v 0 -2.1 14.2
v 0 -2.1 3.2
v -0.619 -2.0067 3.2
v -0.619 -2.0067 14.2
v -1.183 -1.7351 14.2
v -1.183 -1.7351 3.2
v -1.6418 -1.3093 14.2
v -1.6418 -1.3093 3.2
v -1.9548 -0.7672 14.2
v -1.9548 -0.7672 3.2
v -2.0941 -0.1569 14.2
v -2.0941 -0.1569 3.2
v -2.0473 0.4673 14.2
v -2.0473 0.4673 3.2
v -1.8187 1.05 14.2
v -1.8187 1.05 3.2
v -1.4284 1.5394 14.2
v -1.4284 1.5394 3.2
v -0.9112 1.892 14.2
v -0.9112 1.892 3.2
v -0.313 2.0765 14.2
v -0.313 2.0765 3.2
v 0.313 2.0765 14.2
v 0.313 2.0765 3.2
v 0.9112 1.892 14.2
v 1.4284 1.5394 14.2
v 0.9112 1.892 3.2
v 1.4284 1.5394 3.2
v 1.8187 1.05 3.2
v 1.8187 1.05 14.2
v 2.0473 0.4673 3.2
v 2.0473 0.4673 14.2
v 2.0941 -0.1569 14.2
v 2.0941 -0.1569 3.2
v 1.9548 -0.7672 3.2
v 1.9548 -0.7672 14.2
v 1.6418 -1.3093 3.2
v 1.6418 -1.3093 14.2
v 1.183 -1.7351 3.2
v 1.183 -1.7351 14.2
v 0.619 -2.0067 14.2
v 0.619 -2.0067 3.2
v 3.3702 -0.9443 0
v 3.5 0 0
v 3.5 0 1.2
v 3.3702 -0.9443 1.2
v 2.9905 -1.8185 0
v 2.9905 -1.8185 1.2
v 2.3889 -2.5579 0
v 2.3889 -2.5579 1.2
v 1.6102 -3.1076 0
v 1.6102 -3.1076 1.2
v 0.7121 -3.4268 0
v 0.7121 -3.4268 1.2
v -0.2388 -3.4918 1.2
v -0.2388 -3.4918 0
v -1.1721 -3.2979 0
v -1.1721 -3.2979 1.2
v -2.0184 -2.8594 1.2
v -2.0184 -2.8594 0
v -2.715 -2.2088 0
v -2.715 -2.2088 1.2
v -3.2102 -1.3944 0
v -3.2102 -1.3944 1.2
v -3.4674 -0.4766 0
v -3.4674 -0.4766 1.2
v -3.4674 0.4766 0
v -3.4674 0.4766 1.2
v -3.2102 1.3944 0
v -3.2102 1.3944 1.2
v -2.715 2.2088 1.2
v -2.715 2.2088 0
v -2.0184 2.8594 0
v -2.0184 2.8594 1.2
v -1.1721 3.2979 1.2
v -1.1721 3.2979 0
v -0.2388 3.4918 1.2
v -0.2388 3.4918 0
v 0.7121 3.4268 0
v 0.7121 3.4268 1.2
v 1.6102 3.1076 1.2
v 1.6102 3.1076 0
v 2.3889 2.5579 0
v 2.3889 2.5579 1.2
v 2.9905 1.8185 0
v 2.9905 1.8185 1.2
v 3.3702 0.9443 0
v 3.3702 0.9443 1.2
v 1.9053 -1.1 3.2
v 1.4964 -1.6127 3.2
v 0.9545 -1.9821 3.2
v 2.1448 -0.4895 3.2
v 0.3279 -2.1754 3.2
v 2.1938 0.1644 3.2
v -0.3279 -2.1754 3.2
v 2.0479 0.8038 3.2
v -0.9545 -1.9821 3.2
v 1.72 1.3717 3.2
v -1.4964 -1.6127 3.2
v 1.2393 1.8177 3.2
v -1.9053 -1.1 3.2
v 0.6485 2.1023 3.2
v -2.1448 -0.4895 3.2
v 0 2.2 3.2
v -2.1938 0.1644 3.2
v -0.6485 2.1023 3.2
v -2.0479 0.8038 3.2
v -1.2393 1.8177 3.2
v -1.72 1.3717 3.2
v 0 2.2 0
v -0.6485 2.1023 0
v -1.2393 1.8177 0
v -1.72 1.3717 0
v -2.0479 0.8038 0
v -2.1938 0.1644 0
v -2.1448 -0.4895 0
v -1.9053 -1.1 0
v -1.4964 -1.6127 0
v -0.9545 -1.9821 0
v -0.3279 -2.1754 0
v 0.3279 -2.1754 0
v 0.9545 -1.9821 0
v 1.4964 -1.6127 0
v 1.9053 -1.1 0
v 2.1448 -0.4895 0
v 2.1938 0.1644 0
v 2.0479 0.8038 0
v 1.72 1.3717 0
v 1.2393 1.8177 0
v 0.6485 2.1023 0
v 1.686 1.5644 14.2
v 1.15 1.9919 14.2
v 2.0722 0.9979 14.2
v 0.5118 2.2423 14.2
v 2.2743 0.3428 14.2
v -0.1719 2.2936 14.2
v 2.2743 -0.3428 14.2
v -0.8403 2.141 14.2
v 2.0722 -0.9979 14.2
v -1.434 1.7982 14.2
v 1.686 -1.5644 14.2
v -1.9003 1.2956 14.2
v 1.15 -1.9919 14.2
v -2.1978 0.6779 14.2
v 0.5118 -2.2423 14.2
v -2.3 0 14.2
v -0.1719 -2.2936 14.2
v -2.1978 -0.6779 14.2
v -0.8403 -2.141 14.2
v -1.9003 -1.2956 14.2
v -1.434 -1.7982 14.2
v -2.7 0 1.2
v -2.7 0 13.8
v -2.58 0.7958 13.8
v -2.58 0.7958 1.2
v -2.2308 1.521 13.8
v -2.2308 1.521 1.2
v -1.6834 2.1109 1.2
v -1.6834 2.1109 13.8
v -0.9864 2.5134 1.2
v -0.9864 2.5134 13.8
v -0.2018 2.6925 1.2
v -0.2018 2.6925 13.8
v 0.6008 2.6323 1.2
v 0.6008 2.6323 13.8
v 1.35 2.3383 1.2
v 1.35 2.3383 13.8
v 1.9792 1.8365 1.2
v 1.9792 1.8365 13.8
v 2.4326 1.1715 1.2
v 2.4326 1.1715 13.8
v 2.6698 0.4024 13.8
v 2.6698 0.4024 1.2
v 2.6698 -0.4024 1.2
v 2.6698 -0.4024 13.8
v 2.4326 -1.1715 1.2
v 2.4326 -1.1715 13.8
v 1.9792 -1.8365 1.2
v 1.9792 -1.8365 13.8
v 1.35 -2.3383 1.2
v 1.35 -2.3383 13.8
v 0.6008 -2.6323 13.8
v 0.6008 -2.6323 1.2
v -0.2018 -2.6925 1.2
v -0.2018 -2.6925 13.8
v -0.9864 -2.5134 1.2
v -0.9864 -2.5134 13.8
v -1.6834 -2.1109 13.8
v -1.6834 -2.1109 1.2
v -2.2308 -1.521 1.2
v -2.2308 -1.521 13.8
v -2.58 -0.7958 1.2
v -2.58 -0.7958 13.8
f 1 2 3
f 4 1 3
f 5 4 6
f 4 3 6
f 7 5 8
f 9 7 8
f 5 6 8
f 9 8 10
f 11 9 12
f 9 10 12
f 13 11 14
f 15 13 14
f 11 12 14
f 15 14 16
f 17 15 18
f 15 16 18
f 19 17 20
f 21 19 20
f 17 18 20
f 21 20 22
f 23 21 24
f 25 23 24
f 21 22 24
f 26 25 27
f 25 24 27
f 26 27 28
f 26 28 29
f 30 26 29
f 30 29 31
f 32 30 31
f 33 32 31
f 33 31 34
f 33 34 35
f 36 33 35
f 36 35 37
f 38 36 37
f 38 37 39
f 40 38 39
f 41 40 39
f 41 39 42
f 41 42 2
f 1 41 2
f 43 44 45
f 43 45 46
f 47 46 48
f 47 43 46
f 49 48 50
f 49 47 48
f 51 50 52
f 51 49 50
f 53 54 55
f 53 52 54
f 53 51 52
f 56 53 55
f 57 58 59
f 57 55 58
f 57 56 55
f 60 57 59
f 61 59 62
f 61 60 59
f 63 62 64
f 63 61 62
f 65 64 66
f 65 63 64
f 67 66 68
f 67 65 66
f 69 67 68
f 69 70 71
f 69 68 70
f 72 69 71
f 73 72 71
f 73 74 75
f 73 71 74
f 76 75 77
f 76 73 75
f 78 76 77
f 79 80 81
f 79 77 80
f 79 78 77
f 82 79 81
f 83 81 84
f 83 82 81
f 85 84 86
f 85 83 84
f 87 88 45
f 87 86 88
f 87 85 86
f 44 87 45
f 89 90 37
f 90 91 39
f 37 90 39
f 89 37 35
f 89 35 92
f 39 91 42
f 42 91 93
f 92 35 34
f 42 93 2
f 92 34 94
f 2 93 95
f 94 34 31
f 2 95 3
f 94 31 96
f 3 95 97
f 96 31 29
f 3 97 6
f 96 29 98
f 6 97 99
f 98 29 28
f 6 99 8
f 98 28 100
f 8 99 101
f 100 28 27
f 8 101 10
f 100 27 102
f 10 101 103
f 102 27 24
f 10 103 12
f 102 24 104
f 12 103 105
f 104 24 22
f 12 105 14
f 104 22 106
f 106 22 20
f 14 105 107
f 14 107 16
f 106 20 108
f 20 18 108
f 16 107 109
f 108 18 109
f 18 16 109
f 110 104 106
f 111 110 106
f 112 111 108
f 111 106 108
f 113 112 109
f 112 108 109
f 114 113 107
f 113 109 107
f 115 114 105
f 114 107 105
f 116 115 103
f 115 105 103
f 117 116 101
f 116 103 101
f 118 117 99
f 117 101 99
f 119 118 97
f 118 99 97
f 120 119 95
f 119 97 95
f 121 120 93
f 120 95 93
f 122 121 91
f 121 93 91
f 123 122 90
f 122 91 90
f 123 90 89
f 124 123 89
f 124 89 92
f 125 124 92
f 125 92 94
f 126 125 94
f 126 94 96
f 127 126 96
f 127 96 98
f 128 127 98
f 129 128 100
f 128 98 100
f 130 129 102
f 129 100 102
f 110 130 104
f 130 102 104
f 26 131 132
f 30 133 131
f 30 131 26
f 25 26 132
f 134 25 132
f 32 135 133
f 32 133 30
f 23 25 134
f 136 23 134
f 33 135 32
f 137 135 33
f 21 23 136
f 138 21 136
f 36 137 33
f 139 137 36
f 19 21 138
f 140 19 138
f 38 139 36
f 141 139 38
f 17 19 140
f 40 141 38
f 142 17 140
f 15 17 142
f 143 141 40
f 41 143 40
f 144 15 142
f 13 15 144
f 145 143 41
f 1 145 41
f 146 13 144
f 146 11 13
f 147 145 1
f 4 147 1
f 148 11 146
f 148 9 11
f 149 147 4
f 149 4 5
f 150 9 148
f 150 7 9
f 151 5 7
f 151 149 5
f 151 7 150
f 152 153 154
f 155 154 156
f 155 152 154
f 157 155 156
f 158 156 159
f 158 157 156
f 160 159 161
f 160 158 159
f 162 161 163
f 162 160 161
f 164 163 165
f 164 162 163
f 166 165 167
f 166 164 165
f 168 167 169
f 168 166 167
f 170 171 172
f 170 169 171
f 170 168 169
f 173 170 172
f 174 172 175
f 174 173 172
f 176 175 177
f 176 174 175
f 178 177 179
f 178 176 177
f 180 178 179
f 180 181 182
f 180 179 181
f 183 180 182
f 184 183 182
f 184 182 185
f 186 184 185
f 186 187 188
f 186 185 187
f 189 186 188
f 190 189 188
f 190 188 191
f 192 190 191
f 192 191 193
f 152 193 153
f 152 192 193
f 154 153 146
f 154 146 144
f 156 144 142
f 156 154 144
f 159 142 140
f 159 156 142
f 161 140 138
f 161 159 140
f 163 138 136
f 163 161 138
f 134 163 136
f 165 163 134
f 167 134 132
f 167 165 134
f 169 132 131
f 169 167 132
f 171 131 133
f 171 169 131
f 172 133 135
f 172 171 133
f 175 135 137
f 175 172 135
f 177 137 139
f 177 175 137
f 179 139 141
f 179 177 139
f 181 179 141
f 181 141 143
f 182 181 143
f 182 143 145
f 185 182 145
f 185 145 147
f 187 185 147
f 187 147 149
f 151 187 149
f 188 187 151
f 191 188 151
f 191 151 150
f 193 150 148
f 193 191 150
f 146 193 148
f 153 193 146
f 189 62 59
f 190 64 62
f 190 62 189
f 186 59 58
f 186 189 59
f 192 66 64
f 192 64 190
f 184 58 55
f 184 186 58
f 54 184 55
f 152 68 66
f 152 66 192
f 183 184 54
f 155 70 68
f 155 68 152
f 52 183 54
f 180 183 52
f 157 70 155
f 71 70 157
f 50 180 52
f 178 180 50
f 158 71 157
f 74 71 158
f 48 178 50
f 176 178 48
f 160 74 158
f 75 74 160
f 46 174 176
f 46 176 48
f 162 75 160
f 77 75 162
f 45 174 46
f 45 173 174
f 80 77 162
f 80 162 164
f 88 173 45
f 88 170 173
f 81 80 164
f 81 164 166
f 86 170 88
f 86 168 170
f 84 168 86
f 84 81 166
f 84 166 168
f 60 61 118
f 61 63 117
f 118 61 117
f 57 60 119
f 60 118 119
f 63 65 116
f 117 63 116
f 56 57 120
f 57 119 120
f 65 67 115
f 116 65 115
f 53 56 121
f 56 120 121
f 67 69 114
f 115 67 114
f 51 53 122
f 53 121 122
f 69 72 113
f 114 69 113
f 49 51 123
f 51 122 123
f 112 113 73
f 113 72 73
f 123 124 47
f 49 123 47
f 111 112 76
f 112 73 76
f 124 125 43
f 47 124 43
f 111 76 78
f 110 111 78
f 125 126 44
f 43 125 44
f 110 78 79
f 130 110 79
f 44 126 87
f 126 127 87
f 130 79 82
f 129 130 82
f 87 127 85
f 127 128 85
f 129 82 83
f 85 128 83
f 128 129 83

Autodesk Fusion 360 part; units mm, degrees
sketch "Sketch1" plane through (0, 0, 0) normal (0, 0, 1) x (1, 0, 0)
  circle A0 centre (0, 0) radius 3.5
  dimension "d1" = 7
extrude "Extrude1" add sketch "Sketch1" along normal blind 1.2
sketch "Sketch2" plane through (0, 0, 1.2) normal (0, 0, 1) x (-1, 0, 0)
  circle A0 centre (0, 0) radius 3.5
  circle A1 centre (0, 0) radius 2.7
  dimension "d4" = 5.4
extrude "Extrude2" add sketch "Sketch2" along normal blind 13 contours A1
chamfer "Chamfer1" distance 0.4 angle 45 1 edges at (2.5173, 0.9764, 14.2)
sketch "Sketch3" plane through (0, 0, 14.2) normal (0, 0, 1) x (-1, 0, 0)
  circle A0 centre (0, 0) radius 2.3
  circle A1 centre (0, 0) radius 1.9
  dimension "d8" = 3.8
hole "Hole1" at (0, 0, 14.2) direction (0, 0, -1) diameter 4.2 depth 11 tip angle 180
sketch "Sketch4" plane through (0, 0, 0) normal (0, 0, -1) x (1, 0, 0)
  circle A0 centre (0, 0) radius 3.5
  circle A1 centre (0, 0) radius 2.2
  dimension "d12" = 4.4
hole "Hole2" at (0, 0, 0) direction (0, 0, 1) diameter 4.4 depth 3.2 tip angle 180
